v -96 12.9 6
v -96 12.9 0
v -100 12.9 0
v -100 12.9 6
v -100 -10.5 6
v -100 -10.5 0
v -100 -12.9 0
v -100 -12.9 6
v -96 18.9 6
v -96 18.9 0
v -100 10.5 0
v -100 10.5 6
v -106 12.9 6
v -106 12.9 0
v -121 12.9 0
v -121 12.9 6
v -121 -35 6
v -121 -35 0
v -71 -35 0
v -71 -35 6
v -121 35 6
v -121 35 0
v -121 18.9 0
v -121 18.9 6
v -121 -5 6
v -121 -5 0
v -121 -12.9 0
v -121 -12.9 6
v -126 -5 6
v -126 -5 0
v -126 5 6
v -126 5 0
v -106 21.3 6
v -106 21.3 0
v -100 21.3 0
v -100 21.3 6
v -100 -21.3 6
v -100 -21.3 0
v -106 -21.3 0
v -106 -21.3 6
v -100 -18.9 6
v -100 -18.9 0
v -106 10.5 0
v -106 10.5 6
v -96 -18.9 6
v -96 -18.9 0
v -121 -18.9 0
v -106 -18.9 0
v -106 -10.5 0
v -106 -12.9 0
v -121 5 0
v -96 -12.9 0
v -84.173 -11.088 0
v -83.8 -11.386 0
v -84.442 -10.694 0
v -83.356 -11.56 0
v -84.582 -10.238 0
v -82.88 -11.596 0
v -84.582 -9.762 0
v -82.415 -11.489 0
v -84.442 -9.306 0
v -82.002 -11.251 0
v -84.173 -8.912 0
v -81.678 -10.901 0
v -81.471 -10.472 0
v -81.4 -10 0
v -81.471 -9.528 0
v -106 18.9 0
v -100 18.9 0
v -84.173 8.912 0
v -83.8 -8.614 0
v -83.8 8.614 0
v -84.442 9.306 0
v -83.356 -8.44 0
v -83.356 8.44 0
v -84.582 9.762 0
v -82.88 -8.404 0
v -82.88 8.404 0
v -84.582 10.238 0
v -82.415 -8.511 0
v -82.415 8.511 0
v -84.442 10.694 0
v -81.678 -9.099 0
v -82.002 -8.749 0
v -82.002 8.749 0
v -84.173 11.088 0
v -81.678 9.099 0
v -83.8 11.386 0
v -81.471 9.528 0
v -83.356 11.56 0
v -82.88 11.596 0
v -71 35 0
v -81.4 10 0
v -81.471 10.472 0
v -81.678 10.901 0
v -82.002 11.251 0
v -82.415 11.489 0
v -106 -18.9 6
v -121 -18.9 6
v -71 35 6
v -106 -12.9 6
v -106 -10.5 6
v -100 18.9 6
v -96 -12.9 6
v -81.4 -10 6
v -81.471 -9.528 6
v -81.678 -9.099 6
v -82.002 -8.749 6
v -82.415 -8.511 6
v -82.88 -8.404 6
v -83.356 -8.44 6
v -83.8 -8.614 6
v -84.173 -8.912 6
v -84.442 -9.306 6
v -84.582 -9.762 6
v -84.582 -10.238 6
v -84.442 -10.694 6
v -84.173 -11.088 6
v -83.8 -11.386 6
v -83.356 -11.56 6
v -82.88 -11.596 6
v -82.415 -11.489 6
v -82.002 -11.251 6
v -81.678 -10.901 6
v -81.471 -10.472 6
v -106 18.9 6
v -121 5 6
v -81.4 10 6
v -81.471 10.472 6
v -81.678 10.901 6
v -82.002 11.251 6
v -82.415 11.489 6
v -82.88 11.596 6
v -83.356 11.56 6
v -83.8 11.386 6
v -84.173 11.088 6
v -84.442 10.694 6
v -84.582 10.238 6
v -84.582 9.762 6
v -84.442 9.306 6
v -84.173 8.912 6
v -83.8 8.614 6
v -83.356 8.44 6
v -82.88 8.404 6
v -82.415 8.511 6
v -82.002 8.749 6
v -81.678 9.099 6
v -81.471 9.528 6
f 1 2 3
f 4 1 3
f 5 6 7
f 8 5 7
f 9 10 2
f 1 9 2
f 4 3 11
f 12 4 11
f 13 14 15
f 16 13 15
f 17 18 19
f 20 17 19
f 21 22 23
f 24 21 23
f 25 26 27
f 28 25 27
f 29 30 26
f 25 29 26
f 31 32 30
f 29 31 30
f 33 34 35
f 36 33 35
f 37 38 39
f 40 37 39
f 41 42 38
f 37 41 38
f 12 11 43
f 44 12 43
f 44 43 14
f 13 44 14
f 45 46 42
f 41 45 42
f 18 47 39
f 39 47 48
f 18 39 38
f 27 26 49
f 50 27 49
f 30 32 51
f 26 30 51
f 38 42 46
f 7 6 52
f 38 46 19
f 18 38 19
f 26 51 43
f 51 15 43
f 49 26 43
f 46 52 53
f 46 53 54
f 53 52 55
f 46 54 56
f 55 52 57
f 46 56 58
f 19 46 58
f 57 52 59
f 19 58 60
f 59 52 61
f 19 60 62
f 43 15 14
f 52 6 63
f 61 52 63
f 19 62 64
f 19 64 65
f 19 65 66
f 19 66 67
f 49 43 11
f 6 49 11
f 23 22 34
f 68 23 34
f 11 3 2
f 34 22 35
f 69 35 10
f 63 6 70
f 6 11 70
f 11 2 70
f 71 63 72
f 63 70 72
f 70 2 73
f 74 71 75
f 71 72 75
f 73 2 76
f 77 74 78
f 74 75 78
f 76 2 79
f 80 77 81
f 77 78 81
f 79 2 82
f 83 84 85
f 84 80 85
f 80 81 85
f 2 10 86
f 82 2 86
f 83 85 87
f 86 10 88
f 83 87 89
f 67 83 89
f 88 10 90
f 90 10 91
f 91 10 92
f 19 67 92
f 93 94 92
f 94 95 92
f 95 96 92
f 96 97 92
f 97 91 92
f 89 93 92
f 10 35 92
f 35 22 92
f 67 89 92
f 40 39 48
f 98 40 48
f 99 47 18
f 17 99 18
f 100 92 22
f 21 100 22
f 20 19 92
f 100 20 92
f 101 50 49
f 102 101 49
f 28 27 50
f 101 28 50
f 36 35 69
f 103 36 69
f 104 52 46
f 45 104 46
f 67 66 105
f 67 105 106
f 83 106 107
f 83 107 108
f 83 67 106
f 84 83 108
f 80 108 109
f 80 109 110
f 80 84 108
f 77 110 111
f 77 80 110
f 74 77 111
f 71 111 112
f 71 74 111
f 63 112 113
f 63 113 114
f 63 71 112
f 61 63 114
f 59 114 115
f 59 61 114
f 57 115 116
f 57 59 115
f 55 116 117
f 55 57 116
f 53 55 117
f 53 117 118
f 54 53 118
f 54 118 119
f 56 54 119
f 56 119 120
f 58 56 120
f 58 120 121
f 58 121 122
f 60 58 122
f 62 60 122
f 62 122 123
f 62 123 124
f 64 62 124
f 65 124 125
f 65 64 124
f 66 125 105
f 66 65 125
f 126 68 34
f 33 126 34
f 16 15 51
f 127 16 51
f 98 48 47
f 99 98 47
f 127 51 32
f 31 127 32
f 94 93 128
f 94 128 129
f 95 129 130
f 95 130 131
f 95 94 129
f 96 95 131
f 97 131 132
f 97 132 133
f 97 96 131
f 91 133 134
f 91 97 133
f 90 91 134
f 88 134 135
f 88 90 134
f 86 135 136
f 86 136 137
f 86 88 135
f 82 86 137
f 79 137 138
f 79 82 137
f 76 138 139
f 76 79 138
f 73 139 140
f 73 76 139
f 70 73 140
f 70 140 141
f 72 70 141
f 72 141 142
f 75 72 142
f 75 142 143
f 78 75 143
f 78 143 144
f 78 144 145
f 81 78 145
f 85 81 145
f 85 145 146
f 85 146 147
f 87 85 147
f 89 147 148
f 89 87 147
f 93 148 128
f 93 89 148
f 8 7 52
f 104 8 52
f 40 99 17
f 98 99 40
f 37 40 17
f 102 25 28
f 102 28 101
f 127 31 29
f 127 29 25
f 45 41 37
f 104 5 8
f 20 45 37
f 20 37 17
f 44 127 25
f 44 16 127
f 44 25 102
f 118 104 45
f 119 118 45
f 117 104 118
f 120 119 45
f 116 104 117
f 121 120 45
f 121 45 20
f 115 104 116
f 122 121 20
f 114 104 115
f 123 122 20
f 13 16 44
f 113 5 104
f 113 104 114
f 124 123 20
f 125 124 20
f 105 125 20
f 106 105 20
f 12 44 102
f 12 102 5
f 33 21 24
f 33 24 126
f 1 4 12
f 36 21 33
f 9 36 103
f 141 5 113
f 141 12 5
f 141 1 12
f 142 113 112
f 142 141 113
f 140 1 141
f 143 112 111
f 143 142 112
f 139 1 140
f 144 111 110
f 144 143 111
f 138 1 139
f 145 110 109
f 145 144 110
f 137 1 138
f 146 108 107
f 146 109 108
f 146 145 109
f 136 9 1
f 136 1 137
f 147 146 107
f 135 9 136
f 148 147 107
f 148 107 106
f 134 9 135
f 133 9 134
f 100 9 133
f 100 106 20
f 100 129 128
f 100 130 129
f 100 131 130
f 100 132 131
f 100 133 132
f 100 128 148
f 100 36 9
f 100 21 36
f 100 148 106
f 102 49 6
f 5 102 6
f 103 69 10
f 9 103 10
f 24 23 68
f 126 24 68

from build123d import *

# Parameters (mm, degrees)
SKETCH1_R           = 1.6
BOSS_EXTRUDE1_DEPTH = 6


with BuildPart() as part:
    # Sketch1 → Boss-Extrude1 (new body)
    with BuildSketch(Plane.XY):
        Polygon((-121, -35), (-71, -35), (-71, 35), (-121, 35), (-121, 18.9), (-106, 18.9), (-106, 21.3), (-100, 21.3), (-100, 18.9), (-96, 18.9), (-96, 12.9), (-100, 12.9), (-100, 10.5), (-106, 10.5), (-106, 12.9), (-121, 12.9), (-121, 5), (-126, 5), (-126, -5), (-121, -5), (-121, -12.9), (-106, -12.9), (-106, -10.5), (-100, -10.5), (-100, -12.9), (-96, -12.9), (-96, -18.9), (-100, -18.9), (-100, -21.3), (-106, -21.3), (-106, -18.9), (-121, -18.9), align=None)
        with Locations((-83, -10)):
            Circle(SKETCH1_R, mode=Mode.SUBTRACT)
        with Locations((-83, 10)):
            Circle(SKETCH1_R, mode=Mode.SUBTRACT)
    extrude(amount=BOSS_EXTRUDE1_DEPTH)


solid = part.part
